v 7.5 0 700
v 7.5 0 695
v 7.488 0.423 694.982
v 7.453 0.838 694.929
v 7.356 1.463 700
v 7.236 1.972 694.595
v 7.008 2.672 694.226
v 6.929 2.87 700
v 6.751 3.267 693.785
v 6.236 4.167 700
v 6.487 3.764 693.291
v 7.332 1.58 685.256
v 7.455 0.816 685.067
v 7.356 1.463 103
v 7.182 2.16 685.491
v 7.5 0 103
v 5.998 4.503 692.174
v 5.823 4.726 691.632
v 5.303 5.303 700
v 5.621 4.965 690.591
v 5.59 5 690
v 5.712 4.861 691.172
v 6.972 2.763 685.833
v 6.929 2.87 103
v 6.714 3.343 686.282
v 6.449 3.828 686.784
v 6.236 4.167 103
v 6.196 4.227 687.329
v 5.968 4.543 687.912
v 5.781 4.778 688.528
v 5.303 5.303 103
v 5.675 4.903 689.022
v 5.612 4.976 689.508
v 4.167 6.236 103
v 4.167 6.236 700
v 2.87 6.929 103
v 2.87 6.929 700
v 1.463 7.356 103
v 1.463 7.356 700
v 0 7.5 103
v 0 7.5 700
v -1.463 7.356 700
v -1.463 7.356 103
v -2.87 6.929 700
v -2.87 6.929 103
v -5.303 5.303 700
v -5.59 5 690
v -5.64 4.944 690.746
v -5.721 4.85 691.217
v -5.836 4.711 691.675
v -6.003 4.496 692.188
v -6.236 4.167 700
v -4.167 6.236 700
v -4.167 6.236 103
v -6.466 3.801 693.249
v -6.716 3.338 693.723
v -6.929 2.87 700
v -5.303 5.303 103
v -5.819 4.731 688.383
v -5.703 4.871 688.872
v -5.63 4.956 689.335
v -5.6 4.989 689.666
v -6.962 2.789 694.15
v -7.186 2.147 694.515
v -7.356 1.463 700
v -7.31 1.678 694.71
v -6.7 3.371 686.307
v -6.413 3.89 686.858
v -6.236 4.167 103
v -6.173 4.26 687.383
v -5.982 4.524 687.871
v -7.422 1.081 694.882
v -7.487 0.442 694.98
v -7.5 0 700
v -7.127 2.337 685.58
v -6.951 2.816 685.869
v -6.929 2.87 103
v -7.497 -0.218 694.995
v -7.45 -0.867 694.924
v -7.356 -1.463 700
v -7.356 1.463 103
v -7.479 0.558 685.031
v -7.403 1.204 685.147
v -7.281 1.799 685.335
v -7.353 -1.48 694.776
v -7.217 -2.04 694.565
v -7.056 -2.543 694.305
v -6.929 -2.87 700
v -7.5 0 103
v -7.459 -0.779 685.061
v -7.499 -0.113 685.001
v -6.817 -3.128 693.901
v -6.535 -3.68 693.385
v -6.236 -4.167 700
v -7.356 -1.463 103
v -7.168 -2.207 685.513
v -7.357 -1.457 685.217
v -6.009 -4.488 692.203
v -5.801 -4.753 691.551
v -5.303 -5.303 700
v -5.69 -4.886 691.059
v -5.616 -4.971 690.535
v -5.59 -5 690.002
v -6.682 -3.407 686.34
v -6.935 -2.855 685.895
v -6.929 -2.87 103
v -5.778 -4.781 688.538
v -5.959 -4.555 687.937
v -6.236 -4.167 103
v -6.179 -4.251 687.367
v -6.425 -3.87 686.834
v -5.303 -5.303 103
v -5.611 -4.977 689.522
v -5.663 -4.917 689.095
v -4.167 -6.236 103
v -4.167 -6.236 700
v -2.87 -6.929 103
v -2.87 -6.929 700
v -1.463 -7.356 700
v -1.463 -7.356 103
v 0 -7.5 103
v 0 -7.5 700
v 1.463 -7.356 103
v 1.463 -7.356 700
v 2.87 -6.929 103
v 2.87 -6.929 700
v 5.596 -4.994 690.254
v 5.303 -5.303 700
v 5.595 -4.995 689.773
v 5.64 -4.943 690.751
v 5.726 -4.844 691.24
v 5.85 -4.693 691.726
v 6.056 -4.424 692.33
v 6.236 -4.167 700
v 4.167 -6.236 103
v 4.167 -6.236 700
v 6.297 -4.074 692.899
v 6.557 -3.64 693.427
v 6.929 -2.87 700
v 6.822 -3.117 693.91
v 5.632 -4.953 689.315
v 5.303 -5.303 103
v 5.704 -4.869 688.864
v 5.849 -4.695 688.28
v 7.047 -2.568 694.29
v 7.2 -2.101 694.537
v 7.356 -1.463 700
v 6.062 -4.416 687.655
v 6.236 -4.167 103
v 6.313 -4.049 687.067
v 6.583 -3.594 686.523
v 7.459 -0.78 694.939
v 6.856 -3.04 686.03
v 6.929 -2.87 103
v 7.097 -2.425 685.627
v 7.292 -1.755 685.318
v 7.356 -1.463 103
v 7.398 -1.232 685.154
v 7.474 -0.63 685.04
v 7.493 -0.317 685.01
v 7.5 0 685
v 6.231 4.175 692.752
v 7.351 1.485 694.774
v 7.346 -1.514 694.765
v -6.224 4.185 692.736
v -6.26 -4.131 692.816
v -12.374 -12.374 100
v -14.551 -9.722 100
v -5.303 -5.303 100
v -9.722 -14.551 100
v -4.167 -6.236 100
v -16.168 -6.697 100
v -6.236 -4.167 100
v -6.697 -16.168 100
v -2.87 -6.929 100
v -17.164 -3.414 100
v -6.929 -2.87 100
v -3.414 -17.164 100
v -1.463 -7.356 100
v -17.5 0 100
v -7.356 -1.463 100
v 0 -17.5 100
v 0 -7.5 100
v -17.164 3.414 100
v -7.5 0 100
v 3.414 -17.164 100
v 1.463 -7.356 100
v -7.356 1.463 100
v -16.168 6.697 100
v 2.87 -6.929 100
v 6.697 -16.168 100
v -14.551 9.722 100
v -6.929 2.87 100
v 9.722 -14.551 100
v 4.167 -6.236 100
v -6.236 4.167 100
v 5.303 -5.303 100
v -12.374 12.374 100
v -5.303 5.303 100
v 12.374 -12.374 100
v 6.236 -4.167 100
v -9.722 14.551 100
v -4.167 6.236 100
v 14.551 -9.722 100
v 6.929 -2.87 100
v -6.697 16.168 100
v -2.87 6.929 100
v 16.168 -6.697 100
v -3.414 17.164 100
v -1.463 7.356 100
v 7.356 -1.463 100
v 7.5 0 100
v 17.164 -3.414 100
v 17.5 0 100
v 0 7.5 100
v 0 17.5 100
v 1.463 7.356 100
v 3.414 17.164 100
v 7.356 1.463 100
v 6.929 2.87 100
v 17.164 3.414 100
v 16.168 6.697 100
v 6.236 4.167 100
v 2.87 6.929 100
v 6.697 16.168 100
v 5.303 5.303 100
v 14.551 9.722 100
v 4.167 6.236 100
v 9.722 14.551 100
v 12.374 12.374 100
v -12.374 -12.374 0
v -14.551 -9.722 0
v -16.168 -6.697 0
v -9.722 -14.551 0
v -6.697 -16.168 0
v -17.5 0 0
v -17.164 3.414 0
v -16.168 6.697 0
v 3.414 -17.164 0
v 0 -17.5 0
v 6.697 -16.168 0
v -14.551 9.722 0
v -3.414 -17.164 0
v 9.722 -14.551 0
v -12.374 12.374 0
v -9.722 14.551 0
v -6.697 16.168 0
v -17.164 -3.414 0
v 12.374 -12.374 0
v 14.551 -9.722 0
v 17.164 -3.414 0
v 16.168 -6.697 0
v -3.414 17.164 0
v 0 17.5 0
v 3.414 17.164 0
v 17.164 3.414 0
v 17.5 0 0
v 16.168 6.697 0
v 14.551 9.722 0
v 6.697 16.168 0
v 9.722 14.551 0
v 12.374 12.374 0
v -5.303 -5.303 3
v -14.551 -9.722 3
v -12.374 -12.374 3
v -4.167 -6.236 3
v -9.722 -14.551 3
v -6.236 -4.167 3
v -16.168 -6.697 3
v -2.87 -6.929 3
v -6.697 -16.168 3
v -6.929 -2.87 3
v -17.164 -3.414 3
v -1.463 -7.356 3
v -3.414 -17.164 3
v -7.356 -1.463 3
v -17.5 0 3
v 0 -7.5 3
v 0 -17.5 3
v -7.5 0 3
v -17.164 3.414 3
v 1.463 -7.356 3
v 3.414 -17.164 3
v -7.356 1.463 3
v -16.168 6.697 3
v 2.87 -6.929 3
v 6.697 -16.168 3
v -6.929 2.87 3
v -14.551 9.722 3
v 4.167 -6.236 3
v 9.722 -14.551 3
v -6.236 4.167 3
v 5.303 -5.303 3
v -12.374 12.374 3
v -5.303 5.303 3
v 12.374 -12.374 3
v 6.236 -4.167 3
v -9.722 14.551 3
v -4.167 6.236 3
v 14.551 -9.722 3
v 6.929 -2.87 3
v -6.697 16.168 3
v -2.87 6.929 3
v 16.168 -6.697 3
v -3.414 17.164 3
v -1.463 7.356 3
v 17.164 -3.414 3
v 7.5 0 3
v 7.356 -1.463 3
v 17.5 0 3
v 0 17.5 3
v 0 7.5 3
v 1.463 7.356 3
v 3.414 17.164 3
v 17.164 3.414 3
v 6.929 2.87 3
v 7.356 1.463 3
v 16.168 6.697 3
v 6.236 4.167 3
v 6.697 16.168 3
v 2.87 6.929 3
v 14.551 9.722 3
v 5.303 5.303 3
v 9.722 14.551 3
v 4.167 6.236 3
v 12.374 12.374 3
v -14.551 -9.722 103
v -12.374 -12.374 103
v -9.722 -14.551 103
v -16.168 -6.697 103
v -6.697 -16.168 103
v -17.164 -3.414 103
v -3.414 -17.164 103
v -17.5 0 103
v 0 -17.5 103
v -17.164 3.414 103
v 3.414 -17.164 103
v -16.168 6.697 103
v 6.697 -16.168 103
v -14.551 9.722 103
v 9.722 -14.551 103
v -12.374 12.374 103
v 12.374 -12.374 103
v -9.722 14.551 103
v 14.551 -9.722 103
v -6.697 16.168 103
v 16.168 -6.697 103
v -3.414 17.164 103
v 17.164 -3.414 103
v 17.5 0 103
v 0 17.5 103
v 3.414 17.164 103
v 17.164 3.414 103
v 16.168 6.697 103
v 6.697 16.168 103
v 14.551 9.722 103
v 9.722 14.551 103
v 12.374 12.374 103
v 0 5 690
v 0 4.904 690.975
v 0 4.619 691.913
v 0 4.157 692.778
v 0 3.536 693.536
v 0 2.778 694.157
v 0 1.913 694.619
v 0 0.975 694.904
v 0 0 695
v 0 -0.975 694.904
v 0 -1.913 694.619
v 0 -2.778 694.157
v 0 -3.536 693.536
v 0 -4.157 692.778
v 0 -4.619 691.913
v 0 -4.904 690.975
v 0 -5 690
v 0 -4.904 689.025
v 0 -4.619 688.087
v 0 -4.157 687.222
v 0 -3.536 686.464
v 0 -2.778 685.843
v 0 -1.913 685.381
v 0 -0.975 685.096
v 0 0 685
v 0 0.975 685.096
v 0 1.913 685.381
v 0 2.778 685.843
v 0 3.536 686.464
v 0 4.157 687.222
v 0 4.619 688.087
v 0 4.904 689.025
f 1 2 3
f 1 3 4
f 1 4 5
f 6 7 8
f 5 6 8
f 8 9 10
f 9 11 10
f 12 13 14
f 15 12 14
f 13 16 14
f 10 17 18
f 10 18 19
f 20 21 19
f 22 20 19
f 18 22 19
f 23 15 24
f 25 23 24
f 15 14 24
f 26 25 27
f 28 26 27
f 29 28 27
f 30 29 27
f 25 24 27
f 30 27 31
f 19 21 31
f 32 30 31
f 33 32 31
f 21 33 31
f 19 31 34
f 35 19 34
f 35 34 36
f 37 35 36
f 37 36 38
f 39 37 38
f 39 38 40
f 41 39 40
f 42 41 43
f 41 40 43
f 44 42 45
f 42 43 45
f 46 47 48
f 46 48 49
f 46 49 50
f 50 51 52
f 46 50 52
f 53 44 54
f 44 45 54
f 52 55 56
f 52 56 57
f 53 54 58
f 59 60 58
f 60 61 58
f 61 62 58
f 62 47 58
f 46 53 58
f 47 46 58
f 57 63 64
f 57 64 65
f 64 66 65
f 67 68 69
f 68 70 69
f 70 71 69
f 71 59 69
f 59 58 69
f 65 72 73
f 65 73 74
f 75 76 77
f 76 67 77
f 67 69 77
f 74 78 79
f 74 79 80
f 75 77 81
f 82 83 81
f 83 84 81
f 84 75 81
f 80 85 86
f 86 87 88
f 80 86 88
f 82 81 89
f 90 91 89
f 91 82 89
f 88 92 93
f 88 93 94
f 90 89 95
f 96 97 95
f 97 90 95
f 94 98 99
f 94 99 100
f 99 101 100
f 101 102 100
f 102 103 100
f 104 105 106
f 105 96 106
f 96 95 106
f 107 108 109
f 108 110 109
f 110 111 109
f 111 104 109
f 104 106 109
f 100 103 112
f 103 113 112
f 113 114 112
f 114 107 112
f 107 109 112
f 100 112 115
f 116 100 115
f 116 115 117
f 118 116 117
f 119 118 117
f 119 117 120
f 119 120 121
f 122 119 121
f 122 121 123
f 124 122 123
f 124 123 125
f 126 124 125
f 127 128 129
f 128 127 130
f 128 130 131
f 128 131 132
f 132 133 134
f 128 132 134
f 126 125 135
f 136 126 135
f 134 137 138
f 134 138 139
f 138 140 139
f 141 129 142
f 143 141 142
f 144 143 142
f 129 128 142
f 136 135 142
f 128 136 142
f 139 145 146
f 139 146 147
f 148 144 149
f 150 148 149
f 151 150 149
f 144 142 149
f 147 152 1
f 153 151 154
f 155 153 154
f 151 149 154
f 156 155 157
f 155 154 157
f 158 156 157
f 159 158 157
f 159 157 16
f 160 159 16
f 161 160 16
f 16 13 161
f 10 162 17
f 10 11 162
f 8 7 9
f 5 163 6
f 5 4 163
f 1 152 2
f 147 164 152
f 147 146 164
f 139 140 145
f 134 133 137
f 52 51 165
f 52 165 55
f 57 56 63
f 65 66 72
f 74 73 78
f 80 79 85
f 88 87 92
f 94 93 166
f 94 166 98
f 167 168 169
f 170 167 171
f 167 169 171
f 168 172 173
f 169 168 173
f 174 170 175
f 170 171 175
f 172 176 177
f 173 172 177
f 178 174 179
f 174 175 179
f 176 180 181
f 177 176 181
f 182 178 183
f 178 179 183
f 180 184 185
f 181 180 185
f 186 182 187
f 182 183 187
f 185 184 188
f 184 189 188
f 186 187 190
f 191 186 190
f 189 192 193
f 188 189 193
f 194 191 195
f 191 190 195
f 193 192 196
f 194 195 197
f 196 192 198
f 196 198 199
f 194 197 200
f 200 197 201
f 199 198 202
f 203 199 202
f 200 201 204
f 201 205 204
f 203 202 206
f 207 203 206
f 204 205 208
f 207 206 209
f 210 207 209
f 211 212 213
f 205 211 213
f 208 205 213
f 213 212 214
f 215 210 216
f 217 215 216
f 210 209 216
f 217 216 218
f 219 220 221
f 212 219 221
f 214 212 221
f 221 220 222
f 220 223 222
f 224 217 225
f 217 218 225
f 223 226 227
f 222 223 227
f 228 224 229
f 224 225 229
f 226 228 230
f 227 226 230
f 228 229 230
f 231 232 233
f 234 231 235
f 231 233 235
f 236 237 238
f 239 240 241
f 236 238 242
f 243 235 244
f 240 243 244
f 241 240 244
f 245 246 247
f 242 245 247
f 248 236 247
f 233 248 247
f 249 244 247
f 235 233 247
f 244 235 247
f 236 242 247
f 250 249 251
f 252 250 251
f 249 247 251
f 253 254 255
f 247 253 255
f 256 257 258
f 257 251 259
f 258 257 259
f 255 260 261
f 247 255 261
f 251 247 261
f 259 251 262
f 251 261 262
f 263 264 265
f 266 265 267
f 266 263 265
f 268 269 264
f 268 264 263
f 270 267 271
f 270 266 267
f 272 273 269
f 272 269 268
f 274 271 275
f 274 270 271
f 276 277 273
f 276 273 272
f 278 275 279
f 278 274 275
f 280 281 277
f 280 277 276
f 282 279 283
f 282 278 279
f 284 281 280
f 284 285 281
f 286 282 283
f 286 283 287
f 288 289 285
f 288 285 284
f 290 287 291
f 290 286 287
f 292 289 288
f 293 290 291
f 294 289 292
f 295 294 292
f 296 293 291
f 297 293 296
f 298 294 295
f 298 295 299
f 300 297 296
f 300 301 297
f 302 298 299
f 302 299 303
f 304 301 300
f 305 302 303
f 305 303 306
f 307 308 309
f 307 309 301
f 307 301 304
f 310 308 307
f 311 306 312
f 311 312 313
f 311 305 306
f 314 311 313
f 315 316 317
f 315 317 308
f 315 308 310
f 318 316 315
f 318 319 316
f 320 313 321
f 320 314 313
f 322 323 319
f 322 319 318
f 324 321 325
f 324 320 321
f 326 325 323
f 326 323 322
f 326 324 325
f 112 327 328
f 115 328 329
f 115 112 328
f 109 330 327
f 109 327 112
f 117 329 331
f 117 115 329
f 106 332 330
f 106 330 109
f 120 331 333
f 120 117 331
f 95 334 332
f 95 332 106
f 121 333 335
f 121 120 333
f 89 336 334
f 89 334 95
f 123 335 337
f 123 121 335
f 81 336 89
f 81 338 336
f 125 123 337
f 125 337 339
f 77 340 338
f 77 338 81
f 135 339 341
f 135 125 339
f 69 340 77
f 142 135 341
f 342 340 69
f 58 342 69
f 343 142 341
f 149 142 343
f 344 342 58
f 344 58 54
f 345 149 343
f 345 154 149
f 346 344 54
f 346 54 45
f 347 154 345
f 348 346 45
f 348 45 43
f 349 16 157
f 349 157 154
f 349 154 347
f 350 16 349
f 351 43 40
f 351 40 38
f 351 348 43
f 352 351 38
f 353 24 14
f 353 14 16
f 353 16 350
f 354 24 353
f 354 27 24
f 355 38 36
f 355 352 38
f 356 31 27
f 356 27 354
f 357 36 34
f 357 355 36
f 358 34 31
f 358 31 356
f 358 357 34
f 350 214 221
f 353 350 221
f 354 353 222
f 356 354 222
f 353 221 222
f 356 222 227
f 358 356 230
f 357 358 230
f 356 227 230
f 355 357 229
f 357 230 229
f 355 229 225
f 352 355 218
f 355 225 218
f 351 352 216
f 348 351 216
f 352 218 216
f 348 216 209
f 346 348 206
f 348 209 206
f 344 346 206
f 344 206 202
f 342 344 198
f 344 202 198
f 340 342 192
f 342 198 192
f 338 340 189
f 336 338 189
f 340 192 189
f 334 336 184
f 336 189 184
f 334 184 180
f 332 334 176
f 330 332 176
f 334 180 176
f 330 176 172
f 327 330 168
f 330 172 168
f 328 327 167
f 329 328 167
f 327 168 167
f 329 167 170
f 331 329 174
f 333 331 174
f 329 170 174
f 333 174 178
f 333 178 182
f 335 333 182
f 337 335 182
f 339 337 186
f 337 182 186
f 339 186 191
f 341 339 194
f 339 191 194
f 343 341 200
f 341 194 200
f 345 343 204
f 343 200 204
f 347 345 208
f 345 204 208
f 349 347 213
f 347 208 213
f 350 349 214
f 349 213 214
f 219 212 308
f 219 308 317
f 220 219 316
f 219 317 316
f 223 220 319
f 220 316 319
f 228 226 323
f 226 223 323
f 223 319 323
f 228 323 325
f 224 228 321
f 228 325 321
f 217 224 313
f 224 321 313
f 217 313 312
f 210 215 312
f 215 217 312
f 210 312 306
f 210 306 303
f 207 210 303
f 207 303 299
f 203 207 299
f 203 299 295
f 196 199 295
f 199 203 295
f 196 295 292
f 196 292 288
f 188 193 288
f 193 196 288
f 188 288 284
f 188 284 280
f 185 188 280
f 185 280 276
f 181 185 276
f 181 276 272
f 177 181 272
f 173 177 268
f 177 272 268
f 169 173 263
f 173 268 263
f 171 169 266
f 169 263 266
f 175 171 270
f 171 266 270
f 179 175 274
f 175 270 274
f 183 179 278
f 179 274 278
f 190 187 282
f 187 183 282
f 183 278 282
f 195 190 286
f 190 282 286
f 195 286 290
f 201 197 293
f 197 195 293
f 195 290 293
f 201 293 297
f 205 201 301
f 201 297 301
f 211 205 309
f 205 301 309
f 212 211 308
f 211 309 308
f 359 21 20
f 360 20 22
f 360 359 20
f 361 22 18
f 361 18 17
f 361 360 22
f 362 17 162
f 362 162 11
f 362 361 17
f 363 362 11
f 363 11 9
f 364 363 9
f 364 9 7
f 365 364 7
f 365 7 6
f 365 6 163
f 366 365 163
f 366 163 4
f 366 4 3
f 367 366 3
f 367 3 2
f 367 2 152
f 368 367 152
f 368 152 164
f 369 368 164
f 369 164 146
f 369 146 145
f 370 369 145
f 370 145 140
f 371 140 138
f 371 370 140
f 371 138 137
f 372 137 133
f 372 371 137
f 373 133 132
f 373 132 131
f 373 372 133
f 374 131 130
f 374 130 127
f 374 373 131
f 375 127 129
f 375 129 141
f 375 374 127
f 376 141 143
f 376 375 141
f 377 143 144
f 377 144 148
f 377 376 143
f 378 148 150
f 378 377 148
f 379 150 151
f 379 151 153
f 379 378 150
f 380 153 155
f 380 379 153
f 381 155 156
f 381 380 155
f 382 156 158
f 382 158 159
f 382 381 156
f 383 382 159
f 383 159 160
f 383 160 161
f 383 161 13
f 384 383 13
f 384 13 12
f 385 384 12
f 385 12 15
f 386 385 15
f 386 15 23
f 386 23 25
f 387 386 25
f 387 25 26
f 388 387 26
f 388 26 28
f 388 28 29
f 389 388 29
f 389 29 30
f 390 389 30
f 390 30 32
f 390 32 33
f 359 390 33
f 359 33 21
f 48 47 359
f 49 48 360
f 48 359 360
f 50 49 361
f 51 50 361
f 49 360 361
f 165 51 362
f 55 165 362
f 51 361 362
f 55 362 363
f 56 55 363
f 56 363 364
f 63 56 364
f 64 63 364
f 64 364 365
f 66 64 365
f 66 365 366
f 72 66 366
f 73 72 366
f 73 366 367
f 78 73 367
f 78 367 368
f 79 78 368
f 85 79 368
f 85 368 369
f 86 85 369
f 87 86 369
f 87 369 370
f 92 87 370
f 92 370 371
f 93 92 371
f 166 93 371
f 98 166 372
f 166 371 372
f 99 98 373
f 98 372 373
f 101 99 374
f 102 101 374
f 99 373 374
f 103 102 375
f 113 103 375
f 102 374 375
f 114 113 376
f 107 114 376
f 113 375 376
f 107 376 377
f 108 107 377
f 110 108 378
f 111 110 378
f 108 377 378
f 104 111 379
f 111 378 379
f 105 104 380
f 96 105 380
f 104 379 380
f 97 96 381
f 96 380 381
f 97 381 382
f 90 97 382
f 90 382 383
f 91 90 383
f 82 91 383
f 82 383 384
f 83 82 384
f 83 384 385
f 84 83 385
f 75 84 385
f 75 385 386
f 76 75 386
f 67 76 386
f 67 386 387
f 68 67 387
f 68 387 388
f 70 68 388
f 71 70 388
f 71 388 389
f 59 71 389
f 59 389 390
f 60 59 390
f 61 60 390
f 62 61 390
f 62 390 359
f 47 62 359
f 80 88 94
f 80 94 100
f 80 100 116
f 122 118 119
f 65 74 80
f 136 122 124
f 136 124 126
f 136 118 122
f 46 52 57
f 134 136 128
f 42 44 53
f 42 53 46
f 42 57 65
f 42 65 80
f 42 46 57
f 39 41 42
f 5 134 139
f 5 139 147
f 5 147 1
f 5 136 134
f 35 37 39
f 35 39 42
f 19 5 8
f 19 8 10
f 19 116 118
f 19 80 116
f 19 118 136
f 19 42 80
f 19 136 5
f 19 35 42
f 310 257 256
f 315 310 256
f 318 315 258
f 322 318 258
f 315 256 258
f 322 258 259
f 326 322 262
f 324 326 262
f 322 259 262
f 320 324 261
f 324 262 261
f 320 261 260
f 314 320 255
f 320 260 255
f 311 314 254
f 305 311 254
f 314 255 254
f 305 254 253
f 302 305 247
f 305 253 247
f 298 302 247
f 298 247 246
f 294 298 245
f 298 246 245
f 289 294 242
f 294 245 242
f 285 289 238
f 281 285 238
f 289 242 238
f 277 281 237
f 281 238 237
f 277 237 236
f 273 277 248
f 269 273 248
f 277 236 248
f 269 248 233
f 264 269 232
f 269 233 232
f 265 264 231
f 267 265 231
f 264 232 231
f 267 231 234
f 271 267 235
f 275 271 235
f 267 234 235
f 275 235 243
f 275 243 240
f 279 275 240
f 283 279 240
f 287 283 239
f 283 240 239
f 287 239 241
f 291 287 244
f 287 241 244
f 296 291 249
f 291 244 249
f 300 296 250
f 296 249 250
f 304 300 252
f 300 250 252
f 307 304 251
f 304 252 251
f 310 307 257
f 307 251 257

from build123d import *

# Parameters (mm, degrees)
F0_R          = 7.5
F1_DEPTH      = 700
F2_R          = 5
F3_DEPTH      = 7.501
F3_DEPTH_BACK = 7.501
F5_R          = 17.5
F6_DEPTH      = 3
F7_R          = 17.5
F8_DEPTH      = 3


with BuildPart() as f1:
    # F0 (on Top) → F1 (new body)
    with BuildSketch(Plane.XY):
        Circle(F0_R)
    extrude(amount=F1_DEPTH)

    # F2 (on Right) → F3 (cut, two sides)
    with BuildSketch(Plane.YZ) as f3_sk:
        with Locations((0, 690)):
            Circle(F2_R)
    extrude(amount=-F3_DEPTH, mode=Mode.SUBTRACT)
    extrude(f3_sk.sketch, amount=F3_DEPTH_BACK, mode=Mode.SUBTRACT)

    # F5 (on Top) → F6 (join)
    with BuildSketch(Plane.XY):
        Circle(F5_R)
    extrude(amount=F6_DEPTH)

    # F7 (on offset) → F8 (join)
    with BuildSketch(Plane.XY.offset(100)):
        Circle(F7_R)
    extrude(amount=F8_DEPTH)


solid = f1.part
